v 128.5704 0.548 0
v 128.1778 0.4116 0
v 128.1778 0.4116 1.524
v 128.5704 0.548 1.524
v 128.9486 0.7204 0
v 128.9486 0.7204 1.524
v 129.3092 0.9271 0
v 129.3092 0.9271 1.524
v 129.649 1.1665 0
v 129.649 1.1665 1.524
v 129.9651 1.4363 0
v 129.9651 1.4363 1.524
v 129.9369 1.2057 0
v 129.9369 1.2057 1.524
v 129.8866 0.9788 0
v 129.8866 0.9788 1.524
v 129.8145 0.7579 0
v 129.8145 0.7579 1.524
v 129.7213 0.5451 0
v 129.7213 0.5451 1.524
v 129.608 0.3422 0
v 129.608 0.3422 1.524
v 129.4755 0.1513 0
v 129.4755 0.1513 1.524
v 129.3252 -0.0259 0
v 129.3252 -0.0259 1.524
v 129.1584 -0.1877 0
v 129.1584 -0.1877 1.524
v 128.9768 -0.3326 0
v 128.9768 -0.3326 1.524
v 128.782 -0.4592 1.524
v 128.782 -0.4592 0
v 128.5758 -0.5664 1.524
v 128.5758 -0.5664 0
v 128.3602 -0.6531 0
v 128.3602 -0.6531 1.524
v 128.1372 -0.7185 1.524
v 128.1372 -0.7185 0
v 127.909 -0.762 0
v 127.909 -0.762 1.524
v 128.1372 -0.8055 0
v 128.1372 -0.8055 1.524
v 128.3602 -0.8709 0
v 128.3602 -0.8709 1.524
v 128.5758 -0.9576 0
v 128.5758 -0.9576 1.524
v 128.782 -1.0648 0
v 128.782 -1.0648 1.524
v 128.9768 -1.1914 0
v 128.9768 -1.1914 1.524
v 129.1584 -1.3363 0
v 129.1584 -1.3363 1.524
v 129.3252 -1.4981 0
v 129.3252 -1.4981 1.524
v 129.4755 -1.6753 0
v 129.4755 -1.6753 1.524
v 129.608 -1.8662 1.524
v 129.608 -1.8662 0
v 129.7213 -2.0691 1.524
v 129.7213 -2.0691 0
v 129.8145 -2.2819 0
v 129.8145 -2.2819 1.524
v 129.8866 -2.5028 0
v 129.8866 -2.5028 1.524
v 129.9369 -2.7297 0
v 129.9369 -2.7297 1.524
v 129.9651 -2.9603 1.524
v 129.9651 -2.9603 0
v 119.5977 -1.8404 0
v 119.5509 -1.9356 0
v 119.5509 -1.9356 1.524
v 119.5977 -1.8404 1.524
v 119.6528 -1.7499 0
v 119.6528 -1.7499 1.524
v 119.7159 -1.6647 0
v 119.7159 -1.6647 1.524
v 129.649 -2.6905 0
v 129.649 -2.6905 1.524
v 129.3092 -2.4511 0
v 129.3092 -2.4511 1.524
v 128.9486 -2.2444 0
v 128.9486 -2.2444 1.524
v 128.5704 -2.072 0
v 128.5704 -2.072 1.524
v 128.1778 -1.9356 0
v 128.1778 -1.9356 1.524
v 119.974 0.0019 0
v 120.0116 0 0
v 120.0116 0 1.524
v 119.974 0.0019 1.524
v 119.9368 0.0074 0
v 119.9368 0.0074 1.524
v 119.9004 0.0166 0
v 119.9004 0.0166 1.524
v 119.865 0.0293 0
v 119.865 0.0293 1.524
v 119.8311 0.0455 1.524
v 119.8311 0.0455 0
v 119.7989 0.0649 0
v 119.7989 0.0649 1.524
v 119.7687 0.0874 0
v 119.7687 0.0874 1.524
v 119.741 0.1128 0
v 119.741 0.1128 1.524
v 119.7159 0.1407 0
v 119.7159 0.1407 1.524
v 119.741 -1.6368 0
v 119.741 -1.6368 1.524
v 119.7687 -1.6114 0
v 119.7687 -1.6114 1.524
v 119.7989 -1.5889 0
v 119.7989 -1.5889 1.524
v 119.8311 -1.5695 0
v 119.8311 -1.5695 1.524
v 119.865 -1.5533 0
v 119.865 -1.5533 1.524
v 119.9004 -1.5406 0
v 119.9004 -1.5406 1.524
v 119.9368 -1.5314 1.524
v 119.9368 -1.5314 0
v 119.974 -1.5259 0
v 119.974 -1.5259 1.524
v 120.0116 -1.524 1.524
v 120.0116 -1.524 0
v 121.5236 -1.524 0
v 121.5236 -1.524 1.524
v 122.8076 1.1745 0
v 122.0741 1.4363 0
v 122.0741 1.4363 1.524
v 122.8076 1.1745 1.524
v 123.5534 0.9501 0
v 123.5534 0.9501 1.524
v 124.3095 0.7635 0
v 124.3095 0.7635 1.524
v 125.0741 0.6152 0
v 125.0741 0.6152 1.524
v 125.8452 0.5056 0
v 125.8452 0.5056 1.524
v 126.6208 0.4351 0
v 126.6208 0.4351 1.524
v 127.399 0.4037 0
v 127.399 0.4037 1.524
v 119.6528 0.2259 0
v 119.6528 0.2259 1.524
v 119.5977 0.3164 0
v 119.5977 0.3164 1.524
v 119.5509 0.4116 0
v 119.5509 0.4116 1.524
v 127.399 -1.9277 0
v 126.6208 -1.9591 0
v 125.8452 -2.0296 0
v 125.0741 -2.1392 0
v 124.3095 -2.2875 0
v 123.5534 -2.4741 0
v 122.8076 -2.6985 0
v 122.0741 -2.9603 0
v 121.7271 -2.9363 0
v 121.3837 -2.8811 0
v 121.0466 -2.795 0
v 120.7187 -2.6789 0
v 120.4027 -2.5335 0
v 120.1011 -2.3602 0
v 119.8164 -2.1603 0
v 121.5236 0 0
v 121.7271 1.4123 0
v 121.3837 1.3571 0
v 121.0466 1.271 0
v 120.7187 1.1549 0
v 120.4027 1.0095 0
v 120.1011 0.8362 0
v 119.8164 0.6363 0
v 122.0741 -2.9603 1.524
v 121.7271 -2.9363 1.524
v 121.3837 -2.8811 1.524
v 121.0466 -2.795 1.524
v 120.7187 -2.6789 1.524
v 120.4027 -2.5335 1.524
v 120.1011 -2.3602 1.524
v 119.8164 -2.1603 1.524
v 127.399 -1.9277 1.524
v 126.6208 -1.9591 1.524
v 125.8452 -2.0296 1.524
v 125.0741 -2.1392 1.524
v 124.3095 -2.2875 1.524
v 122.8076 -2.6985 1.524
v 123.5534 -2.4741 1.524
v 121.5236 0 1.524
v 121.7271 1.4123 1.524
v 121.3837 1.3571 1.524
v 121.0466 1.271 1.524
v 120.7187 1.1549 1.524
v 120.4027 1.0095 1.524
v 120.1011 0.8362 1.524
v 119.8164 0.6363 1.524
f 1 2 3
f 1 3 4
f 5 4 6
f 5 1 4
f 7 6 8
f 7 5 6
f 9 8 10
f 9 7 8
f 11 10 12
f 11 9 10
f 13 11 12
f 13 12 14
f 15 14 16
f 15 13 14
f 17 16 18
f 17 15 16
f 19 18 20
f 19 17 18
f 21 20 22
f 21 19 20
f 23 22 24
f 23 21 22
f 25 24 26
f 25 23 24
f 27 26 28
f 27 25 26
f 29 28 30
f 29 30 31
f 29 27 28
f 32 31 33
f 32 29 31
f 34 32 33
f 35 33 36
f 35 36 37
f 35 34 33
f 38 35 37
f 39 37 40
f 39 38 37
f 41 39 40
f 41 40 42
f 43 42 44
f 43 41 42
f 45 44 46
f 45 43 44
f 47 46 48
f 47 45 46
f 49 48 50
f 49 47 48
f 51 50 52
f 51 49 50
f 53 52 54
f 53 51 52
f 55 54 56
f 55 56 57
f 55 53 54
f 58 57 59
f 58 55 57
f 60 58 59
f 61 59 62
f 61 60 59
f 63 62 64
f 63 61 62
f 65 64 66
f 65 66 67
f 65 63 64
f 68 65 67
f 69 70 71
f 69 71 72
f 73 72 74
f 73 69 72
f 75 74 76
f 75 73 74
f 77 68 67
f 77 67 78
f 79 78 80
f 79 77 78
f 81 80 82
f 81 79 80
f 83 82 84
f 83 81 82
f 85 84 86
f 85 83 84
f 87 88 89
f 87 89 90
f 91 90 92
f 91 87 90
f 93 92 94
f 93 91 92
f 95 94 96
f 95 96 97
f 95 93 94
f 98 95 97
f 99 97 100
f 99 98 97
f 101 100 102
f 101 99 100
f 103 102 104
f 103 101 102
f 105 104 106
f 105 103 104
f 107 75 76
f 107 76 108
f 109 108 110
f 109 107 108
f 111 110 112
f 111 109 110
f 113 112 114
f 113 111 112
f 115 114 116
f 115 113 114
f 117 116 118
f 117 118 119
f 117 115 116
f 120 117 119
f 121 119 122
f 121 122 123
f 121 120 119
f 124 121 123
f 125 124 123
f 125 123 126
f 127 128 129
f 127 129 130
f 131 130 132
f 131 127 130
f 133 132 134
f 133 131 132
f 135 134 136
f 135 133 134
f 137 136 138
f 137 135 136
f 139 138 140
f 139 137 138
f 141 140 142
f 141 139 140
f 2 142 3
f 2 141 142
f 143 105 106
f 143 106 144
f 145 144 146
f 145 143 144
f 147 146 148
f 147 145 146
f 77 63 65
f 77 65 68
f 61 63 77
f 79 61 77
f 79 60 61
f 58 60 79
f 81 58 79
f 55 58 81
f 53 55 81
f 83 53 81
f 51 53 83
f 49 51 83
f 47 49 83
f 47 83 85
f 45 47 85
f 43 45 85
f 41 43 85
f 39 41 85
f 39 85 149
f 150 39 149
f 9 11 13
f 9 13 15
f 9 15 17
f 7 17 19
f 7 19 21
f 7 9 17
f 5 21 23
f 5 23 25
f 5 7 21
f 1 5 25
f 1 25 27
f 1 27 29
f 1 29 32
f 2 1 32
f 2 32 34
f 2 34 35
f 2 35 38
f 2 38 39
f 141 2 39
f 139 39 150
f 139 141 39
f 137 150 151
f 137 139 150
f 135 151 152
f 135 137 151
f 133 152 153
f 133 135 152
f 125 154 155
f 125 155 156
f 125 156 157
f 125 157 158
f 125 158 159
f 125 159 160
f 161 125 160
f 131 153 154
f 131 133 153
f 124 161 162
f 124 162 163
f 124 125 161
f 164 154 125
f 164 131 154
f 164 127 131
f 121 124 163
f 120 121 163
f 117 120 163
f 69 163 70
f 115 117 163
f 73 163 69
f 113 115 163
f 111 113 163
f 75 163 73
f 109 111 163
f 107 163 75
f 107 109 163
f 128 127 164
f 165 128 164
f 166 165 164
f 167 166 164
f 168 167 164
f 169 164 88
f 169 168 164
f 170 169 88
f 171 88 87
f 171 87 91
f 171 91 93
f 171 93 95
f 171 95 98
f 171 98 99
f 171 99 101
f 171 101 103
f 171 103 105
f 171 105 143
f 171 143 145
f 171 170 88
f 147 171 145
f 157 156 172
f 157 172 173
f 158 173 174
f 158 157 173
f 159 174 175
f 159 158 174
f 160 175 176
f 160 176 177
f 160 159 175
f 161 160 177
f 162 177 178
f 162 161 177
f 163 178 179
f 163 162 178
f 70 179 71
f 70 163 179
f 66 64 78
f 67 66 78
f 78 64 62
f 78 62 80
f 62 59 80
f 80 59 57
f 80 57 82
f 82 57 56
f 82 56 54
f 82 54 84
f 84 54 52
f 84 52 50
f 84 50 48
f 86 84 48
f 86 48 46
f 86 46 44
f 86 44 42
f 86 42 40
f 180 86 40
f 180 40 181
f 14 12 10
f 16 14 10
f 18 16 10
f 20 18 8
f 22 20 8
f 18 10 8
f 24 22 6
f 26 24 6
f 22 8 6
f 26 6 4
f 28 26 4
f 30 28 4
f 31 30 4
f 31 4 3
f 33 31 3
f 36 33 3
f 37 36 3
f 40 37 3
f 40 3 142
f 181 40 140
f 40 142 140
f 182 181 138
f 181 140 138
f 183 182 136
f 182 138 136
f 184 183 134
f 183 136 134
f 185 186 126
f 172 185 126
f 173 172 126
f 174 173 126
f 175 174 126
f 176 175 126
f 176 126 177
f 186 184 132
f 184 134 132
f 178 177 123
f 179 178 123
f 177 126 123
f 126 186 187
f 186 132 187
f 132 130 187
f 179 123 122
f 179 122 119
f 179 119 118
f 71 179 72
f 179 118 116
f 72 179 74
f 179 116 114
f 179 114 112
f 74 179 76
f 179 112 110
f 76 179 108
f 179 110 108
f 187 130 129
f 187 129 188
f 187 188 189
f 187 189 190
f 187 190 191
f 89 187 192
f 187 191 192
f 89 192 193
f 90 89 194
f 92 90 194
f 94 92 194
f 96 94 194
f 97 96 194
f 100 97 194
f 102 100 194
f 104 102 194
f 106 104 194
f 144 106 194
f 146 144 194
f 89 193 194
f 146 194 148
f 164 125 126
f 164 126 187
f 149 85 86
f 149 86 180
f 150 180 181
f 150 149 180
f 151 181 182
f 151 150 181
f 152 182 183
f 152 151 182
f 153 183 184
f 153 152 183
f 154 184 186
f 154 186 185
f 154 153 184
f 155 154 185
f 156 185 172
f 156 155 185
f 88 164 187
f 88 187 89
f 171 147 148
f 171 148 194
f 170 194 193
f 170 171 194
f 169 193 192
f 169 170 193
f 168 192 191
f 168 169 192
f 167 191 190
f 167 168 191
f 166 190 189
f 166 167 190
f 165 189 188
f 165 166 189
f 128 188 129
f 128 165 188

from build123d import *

# Parameters (mm, degrees)
BOSS_EXTRUDE1_DEPTH = 1.524


with BuildPart() as part:
    # Sketch1 → Boss-Extrude1 (new body)
    with BuildSketch(Plane.XY):
        with BuildLine():
            Line((121.523623664, 0), (120.01155741, 0))
            ThreePointArc((120.01155741, 0), (119.847826563, 0.036974987), (119.71587496, 0.140723308))
            ThreePointArc((119.71587496, 0.140723308), (119.624223582, 0.270551073), (119.550930958, 0.411559635))
            ThreePointArc((119.550930958, 0.411559635), (120.718745933, 1.154856432), (122.0741261, 1.436328542))
            ThreePointArc((122.0741261, 1.436328542), (125.07411423, 0.615177069), (128.177782779, 0.411559635))
            ThreePointArc((128.177782779, 0.411559635), (129.131308323, 0.819549331), (129.965124825, 1.436328542))
            ThreePointArc((129.965124825, 1.436328542), (129.325202776, -0.025891409), (127.908964253, -0.762))
            ThreePointArc((127.908964253, -0.762), (129.325202776, -1.498108591), (129.965124825, -2.960328542))
            ThreePointArc((129.965124825, -2.960328542), (129.131308323, -2.343549331), (128.177782779, -1.935559635))
            ThreePointArc((128.177782779, -1.935559635), (125.07411423, -2.139177069), (122.0741261, -2.960328542))
            ThreePointArc((122.0741261, -2.960328542), (120.718745933, -2.678856432), (119.550930958, -1.935559635))
            ThreePointArc((119.550930958, -1.935559635), (119.624223582, -1.794551073), (119.71587496, -1.664723308))
            ThreePointArc((119.71587496, -1.664723308), (119.847826563, -1.560974987), (120.01155741, -1.524))
            Line((120.01155741, -1.524), (121.523623664, -1.524))
            Line((121.523623664, -1.524), (121.523623664, 0))
        make_face()
    extrude(amount=BOSS_EXTRUDE1_DEPTH)


solid = part.part
